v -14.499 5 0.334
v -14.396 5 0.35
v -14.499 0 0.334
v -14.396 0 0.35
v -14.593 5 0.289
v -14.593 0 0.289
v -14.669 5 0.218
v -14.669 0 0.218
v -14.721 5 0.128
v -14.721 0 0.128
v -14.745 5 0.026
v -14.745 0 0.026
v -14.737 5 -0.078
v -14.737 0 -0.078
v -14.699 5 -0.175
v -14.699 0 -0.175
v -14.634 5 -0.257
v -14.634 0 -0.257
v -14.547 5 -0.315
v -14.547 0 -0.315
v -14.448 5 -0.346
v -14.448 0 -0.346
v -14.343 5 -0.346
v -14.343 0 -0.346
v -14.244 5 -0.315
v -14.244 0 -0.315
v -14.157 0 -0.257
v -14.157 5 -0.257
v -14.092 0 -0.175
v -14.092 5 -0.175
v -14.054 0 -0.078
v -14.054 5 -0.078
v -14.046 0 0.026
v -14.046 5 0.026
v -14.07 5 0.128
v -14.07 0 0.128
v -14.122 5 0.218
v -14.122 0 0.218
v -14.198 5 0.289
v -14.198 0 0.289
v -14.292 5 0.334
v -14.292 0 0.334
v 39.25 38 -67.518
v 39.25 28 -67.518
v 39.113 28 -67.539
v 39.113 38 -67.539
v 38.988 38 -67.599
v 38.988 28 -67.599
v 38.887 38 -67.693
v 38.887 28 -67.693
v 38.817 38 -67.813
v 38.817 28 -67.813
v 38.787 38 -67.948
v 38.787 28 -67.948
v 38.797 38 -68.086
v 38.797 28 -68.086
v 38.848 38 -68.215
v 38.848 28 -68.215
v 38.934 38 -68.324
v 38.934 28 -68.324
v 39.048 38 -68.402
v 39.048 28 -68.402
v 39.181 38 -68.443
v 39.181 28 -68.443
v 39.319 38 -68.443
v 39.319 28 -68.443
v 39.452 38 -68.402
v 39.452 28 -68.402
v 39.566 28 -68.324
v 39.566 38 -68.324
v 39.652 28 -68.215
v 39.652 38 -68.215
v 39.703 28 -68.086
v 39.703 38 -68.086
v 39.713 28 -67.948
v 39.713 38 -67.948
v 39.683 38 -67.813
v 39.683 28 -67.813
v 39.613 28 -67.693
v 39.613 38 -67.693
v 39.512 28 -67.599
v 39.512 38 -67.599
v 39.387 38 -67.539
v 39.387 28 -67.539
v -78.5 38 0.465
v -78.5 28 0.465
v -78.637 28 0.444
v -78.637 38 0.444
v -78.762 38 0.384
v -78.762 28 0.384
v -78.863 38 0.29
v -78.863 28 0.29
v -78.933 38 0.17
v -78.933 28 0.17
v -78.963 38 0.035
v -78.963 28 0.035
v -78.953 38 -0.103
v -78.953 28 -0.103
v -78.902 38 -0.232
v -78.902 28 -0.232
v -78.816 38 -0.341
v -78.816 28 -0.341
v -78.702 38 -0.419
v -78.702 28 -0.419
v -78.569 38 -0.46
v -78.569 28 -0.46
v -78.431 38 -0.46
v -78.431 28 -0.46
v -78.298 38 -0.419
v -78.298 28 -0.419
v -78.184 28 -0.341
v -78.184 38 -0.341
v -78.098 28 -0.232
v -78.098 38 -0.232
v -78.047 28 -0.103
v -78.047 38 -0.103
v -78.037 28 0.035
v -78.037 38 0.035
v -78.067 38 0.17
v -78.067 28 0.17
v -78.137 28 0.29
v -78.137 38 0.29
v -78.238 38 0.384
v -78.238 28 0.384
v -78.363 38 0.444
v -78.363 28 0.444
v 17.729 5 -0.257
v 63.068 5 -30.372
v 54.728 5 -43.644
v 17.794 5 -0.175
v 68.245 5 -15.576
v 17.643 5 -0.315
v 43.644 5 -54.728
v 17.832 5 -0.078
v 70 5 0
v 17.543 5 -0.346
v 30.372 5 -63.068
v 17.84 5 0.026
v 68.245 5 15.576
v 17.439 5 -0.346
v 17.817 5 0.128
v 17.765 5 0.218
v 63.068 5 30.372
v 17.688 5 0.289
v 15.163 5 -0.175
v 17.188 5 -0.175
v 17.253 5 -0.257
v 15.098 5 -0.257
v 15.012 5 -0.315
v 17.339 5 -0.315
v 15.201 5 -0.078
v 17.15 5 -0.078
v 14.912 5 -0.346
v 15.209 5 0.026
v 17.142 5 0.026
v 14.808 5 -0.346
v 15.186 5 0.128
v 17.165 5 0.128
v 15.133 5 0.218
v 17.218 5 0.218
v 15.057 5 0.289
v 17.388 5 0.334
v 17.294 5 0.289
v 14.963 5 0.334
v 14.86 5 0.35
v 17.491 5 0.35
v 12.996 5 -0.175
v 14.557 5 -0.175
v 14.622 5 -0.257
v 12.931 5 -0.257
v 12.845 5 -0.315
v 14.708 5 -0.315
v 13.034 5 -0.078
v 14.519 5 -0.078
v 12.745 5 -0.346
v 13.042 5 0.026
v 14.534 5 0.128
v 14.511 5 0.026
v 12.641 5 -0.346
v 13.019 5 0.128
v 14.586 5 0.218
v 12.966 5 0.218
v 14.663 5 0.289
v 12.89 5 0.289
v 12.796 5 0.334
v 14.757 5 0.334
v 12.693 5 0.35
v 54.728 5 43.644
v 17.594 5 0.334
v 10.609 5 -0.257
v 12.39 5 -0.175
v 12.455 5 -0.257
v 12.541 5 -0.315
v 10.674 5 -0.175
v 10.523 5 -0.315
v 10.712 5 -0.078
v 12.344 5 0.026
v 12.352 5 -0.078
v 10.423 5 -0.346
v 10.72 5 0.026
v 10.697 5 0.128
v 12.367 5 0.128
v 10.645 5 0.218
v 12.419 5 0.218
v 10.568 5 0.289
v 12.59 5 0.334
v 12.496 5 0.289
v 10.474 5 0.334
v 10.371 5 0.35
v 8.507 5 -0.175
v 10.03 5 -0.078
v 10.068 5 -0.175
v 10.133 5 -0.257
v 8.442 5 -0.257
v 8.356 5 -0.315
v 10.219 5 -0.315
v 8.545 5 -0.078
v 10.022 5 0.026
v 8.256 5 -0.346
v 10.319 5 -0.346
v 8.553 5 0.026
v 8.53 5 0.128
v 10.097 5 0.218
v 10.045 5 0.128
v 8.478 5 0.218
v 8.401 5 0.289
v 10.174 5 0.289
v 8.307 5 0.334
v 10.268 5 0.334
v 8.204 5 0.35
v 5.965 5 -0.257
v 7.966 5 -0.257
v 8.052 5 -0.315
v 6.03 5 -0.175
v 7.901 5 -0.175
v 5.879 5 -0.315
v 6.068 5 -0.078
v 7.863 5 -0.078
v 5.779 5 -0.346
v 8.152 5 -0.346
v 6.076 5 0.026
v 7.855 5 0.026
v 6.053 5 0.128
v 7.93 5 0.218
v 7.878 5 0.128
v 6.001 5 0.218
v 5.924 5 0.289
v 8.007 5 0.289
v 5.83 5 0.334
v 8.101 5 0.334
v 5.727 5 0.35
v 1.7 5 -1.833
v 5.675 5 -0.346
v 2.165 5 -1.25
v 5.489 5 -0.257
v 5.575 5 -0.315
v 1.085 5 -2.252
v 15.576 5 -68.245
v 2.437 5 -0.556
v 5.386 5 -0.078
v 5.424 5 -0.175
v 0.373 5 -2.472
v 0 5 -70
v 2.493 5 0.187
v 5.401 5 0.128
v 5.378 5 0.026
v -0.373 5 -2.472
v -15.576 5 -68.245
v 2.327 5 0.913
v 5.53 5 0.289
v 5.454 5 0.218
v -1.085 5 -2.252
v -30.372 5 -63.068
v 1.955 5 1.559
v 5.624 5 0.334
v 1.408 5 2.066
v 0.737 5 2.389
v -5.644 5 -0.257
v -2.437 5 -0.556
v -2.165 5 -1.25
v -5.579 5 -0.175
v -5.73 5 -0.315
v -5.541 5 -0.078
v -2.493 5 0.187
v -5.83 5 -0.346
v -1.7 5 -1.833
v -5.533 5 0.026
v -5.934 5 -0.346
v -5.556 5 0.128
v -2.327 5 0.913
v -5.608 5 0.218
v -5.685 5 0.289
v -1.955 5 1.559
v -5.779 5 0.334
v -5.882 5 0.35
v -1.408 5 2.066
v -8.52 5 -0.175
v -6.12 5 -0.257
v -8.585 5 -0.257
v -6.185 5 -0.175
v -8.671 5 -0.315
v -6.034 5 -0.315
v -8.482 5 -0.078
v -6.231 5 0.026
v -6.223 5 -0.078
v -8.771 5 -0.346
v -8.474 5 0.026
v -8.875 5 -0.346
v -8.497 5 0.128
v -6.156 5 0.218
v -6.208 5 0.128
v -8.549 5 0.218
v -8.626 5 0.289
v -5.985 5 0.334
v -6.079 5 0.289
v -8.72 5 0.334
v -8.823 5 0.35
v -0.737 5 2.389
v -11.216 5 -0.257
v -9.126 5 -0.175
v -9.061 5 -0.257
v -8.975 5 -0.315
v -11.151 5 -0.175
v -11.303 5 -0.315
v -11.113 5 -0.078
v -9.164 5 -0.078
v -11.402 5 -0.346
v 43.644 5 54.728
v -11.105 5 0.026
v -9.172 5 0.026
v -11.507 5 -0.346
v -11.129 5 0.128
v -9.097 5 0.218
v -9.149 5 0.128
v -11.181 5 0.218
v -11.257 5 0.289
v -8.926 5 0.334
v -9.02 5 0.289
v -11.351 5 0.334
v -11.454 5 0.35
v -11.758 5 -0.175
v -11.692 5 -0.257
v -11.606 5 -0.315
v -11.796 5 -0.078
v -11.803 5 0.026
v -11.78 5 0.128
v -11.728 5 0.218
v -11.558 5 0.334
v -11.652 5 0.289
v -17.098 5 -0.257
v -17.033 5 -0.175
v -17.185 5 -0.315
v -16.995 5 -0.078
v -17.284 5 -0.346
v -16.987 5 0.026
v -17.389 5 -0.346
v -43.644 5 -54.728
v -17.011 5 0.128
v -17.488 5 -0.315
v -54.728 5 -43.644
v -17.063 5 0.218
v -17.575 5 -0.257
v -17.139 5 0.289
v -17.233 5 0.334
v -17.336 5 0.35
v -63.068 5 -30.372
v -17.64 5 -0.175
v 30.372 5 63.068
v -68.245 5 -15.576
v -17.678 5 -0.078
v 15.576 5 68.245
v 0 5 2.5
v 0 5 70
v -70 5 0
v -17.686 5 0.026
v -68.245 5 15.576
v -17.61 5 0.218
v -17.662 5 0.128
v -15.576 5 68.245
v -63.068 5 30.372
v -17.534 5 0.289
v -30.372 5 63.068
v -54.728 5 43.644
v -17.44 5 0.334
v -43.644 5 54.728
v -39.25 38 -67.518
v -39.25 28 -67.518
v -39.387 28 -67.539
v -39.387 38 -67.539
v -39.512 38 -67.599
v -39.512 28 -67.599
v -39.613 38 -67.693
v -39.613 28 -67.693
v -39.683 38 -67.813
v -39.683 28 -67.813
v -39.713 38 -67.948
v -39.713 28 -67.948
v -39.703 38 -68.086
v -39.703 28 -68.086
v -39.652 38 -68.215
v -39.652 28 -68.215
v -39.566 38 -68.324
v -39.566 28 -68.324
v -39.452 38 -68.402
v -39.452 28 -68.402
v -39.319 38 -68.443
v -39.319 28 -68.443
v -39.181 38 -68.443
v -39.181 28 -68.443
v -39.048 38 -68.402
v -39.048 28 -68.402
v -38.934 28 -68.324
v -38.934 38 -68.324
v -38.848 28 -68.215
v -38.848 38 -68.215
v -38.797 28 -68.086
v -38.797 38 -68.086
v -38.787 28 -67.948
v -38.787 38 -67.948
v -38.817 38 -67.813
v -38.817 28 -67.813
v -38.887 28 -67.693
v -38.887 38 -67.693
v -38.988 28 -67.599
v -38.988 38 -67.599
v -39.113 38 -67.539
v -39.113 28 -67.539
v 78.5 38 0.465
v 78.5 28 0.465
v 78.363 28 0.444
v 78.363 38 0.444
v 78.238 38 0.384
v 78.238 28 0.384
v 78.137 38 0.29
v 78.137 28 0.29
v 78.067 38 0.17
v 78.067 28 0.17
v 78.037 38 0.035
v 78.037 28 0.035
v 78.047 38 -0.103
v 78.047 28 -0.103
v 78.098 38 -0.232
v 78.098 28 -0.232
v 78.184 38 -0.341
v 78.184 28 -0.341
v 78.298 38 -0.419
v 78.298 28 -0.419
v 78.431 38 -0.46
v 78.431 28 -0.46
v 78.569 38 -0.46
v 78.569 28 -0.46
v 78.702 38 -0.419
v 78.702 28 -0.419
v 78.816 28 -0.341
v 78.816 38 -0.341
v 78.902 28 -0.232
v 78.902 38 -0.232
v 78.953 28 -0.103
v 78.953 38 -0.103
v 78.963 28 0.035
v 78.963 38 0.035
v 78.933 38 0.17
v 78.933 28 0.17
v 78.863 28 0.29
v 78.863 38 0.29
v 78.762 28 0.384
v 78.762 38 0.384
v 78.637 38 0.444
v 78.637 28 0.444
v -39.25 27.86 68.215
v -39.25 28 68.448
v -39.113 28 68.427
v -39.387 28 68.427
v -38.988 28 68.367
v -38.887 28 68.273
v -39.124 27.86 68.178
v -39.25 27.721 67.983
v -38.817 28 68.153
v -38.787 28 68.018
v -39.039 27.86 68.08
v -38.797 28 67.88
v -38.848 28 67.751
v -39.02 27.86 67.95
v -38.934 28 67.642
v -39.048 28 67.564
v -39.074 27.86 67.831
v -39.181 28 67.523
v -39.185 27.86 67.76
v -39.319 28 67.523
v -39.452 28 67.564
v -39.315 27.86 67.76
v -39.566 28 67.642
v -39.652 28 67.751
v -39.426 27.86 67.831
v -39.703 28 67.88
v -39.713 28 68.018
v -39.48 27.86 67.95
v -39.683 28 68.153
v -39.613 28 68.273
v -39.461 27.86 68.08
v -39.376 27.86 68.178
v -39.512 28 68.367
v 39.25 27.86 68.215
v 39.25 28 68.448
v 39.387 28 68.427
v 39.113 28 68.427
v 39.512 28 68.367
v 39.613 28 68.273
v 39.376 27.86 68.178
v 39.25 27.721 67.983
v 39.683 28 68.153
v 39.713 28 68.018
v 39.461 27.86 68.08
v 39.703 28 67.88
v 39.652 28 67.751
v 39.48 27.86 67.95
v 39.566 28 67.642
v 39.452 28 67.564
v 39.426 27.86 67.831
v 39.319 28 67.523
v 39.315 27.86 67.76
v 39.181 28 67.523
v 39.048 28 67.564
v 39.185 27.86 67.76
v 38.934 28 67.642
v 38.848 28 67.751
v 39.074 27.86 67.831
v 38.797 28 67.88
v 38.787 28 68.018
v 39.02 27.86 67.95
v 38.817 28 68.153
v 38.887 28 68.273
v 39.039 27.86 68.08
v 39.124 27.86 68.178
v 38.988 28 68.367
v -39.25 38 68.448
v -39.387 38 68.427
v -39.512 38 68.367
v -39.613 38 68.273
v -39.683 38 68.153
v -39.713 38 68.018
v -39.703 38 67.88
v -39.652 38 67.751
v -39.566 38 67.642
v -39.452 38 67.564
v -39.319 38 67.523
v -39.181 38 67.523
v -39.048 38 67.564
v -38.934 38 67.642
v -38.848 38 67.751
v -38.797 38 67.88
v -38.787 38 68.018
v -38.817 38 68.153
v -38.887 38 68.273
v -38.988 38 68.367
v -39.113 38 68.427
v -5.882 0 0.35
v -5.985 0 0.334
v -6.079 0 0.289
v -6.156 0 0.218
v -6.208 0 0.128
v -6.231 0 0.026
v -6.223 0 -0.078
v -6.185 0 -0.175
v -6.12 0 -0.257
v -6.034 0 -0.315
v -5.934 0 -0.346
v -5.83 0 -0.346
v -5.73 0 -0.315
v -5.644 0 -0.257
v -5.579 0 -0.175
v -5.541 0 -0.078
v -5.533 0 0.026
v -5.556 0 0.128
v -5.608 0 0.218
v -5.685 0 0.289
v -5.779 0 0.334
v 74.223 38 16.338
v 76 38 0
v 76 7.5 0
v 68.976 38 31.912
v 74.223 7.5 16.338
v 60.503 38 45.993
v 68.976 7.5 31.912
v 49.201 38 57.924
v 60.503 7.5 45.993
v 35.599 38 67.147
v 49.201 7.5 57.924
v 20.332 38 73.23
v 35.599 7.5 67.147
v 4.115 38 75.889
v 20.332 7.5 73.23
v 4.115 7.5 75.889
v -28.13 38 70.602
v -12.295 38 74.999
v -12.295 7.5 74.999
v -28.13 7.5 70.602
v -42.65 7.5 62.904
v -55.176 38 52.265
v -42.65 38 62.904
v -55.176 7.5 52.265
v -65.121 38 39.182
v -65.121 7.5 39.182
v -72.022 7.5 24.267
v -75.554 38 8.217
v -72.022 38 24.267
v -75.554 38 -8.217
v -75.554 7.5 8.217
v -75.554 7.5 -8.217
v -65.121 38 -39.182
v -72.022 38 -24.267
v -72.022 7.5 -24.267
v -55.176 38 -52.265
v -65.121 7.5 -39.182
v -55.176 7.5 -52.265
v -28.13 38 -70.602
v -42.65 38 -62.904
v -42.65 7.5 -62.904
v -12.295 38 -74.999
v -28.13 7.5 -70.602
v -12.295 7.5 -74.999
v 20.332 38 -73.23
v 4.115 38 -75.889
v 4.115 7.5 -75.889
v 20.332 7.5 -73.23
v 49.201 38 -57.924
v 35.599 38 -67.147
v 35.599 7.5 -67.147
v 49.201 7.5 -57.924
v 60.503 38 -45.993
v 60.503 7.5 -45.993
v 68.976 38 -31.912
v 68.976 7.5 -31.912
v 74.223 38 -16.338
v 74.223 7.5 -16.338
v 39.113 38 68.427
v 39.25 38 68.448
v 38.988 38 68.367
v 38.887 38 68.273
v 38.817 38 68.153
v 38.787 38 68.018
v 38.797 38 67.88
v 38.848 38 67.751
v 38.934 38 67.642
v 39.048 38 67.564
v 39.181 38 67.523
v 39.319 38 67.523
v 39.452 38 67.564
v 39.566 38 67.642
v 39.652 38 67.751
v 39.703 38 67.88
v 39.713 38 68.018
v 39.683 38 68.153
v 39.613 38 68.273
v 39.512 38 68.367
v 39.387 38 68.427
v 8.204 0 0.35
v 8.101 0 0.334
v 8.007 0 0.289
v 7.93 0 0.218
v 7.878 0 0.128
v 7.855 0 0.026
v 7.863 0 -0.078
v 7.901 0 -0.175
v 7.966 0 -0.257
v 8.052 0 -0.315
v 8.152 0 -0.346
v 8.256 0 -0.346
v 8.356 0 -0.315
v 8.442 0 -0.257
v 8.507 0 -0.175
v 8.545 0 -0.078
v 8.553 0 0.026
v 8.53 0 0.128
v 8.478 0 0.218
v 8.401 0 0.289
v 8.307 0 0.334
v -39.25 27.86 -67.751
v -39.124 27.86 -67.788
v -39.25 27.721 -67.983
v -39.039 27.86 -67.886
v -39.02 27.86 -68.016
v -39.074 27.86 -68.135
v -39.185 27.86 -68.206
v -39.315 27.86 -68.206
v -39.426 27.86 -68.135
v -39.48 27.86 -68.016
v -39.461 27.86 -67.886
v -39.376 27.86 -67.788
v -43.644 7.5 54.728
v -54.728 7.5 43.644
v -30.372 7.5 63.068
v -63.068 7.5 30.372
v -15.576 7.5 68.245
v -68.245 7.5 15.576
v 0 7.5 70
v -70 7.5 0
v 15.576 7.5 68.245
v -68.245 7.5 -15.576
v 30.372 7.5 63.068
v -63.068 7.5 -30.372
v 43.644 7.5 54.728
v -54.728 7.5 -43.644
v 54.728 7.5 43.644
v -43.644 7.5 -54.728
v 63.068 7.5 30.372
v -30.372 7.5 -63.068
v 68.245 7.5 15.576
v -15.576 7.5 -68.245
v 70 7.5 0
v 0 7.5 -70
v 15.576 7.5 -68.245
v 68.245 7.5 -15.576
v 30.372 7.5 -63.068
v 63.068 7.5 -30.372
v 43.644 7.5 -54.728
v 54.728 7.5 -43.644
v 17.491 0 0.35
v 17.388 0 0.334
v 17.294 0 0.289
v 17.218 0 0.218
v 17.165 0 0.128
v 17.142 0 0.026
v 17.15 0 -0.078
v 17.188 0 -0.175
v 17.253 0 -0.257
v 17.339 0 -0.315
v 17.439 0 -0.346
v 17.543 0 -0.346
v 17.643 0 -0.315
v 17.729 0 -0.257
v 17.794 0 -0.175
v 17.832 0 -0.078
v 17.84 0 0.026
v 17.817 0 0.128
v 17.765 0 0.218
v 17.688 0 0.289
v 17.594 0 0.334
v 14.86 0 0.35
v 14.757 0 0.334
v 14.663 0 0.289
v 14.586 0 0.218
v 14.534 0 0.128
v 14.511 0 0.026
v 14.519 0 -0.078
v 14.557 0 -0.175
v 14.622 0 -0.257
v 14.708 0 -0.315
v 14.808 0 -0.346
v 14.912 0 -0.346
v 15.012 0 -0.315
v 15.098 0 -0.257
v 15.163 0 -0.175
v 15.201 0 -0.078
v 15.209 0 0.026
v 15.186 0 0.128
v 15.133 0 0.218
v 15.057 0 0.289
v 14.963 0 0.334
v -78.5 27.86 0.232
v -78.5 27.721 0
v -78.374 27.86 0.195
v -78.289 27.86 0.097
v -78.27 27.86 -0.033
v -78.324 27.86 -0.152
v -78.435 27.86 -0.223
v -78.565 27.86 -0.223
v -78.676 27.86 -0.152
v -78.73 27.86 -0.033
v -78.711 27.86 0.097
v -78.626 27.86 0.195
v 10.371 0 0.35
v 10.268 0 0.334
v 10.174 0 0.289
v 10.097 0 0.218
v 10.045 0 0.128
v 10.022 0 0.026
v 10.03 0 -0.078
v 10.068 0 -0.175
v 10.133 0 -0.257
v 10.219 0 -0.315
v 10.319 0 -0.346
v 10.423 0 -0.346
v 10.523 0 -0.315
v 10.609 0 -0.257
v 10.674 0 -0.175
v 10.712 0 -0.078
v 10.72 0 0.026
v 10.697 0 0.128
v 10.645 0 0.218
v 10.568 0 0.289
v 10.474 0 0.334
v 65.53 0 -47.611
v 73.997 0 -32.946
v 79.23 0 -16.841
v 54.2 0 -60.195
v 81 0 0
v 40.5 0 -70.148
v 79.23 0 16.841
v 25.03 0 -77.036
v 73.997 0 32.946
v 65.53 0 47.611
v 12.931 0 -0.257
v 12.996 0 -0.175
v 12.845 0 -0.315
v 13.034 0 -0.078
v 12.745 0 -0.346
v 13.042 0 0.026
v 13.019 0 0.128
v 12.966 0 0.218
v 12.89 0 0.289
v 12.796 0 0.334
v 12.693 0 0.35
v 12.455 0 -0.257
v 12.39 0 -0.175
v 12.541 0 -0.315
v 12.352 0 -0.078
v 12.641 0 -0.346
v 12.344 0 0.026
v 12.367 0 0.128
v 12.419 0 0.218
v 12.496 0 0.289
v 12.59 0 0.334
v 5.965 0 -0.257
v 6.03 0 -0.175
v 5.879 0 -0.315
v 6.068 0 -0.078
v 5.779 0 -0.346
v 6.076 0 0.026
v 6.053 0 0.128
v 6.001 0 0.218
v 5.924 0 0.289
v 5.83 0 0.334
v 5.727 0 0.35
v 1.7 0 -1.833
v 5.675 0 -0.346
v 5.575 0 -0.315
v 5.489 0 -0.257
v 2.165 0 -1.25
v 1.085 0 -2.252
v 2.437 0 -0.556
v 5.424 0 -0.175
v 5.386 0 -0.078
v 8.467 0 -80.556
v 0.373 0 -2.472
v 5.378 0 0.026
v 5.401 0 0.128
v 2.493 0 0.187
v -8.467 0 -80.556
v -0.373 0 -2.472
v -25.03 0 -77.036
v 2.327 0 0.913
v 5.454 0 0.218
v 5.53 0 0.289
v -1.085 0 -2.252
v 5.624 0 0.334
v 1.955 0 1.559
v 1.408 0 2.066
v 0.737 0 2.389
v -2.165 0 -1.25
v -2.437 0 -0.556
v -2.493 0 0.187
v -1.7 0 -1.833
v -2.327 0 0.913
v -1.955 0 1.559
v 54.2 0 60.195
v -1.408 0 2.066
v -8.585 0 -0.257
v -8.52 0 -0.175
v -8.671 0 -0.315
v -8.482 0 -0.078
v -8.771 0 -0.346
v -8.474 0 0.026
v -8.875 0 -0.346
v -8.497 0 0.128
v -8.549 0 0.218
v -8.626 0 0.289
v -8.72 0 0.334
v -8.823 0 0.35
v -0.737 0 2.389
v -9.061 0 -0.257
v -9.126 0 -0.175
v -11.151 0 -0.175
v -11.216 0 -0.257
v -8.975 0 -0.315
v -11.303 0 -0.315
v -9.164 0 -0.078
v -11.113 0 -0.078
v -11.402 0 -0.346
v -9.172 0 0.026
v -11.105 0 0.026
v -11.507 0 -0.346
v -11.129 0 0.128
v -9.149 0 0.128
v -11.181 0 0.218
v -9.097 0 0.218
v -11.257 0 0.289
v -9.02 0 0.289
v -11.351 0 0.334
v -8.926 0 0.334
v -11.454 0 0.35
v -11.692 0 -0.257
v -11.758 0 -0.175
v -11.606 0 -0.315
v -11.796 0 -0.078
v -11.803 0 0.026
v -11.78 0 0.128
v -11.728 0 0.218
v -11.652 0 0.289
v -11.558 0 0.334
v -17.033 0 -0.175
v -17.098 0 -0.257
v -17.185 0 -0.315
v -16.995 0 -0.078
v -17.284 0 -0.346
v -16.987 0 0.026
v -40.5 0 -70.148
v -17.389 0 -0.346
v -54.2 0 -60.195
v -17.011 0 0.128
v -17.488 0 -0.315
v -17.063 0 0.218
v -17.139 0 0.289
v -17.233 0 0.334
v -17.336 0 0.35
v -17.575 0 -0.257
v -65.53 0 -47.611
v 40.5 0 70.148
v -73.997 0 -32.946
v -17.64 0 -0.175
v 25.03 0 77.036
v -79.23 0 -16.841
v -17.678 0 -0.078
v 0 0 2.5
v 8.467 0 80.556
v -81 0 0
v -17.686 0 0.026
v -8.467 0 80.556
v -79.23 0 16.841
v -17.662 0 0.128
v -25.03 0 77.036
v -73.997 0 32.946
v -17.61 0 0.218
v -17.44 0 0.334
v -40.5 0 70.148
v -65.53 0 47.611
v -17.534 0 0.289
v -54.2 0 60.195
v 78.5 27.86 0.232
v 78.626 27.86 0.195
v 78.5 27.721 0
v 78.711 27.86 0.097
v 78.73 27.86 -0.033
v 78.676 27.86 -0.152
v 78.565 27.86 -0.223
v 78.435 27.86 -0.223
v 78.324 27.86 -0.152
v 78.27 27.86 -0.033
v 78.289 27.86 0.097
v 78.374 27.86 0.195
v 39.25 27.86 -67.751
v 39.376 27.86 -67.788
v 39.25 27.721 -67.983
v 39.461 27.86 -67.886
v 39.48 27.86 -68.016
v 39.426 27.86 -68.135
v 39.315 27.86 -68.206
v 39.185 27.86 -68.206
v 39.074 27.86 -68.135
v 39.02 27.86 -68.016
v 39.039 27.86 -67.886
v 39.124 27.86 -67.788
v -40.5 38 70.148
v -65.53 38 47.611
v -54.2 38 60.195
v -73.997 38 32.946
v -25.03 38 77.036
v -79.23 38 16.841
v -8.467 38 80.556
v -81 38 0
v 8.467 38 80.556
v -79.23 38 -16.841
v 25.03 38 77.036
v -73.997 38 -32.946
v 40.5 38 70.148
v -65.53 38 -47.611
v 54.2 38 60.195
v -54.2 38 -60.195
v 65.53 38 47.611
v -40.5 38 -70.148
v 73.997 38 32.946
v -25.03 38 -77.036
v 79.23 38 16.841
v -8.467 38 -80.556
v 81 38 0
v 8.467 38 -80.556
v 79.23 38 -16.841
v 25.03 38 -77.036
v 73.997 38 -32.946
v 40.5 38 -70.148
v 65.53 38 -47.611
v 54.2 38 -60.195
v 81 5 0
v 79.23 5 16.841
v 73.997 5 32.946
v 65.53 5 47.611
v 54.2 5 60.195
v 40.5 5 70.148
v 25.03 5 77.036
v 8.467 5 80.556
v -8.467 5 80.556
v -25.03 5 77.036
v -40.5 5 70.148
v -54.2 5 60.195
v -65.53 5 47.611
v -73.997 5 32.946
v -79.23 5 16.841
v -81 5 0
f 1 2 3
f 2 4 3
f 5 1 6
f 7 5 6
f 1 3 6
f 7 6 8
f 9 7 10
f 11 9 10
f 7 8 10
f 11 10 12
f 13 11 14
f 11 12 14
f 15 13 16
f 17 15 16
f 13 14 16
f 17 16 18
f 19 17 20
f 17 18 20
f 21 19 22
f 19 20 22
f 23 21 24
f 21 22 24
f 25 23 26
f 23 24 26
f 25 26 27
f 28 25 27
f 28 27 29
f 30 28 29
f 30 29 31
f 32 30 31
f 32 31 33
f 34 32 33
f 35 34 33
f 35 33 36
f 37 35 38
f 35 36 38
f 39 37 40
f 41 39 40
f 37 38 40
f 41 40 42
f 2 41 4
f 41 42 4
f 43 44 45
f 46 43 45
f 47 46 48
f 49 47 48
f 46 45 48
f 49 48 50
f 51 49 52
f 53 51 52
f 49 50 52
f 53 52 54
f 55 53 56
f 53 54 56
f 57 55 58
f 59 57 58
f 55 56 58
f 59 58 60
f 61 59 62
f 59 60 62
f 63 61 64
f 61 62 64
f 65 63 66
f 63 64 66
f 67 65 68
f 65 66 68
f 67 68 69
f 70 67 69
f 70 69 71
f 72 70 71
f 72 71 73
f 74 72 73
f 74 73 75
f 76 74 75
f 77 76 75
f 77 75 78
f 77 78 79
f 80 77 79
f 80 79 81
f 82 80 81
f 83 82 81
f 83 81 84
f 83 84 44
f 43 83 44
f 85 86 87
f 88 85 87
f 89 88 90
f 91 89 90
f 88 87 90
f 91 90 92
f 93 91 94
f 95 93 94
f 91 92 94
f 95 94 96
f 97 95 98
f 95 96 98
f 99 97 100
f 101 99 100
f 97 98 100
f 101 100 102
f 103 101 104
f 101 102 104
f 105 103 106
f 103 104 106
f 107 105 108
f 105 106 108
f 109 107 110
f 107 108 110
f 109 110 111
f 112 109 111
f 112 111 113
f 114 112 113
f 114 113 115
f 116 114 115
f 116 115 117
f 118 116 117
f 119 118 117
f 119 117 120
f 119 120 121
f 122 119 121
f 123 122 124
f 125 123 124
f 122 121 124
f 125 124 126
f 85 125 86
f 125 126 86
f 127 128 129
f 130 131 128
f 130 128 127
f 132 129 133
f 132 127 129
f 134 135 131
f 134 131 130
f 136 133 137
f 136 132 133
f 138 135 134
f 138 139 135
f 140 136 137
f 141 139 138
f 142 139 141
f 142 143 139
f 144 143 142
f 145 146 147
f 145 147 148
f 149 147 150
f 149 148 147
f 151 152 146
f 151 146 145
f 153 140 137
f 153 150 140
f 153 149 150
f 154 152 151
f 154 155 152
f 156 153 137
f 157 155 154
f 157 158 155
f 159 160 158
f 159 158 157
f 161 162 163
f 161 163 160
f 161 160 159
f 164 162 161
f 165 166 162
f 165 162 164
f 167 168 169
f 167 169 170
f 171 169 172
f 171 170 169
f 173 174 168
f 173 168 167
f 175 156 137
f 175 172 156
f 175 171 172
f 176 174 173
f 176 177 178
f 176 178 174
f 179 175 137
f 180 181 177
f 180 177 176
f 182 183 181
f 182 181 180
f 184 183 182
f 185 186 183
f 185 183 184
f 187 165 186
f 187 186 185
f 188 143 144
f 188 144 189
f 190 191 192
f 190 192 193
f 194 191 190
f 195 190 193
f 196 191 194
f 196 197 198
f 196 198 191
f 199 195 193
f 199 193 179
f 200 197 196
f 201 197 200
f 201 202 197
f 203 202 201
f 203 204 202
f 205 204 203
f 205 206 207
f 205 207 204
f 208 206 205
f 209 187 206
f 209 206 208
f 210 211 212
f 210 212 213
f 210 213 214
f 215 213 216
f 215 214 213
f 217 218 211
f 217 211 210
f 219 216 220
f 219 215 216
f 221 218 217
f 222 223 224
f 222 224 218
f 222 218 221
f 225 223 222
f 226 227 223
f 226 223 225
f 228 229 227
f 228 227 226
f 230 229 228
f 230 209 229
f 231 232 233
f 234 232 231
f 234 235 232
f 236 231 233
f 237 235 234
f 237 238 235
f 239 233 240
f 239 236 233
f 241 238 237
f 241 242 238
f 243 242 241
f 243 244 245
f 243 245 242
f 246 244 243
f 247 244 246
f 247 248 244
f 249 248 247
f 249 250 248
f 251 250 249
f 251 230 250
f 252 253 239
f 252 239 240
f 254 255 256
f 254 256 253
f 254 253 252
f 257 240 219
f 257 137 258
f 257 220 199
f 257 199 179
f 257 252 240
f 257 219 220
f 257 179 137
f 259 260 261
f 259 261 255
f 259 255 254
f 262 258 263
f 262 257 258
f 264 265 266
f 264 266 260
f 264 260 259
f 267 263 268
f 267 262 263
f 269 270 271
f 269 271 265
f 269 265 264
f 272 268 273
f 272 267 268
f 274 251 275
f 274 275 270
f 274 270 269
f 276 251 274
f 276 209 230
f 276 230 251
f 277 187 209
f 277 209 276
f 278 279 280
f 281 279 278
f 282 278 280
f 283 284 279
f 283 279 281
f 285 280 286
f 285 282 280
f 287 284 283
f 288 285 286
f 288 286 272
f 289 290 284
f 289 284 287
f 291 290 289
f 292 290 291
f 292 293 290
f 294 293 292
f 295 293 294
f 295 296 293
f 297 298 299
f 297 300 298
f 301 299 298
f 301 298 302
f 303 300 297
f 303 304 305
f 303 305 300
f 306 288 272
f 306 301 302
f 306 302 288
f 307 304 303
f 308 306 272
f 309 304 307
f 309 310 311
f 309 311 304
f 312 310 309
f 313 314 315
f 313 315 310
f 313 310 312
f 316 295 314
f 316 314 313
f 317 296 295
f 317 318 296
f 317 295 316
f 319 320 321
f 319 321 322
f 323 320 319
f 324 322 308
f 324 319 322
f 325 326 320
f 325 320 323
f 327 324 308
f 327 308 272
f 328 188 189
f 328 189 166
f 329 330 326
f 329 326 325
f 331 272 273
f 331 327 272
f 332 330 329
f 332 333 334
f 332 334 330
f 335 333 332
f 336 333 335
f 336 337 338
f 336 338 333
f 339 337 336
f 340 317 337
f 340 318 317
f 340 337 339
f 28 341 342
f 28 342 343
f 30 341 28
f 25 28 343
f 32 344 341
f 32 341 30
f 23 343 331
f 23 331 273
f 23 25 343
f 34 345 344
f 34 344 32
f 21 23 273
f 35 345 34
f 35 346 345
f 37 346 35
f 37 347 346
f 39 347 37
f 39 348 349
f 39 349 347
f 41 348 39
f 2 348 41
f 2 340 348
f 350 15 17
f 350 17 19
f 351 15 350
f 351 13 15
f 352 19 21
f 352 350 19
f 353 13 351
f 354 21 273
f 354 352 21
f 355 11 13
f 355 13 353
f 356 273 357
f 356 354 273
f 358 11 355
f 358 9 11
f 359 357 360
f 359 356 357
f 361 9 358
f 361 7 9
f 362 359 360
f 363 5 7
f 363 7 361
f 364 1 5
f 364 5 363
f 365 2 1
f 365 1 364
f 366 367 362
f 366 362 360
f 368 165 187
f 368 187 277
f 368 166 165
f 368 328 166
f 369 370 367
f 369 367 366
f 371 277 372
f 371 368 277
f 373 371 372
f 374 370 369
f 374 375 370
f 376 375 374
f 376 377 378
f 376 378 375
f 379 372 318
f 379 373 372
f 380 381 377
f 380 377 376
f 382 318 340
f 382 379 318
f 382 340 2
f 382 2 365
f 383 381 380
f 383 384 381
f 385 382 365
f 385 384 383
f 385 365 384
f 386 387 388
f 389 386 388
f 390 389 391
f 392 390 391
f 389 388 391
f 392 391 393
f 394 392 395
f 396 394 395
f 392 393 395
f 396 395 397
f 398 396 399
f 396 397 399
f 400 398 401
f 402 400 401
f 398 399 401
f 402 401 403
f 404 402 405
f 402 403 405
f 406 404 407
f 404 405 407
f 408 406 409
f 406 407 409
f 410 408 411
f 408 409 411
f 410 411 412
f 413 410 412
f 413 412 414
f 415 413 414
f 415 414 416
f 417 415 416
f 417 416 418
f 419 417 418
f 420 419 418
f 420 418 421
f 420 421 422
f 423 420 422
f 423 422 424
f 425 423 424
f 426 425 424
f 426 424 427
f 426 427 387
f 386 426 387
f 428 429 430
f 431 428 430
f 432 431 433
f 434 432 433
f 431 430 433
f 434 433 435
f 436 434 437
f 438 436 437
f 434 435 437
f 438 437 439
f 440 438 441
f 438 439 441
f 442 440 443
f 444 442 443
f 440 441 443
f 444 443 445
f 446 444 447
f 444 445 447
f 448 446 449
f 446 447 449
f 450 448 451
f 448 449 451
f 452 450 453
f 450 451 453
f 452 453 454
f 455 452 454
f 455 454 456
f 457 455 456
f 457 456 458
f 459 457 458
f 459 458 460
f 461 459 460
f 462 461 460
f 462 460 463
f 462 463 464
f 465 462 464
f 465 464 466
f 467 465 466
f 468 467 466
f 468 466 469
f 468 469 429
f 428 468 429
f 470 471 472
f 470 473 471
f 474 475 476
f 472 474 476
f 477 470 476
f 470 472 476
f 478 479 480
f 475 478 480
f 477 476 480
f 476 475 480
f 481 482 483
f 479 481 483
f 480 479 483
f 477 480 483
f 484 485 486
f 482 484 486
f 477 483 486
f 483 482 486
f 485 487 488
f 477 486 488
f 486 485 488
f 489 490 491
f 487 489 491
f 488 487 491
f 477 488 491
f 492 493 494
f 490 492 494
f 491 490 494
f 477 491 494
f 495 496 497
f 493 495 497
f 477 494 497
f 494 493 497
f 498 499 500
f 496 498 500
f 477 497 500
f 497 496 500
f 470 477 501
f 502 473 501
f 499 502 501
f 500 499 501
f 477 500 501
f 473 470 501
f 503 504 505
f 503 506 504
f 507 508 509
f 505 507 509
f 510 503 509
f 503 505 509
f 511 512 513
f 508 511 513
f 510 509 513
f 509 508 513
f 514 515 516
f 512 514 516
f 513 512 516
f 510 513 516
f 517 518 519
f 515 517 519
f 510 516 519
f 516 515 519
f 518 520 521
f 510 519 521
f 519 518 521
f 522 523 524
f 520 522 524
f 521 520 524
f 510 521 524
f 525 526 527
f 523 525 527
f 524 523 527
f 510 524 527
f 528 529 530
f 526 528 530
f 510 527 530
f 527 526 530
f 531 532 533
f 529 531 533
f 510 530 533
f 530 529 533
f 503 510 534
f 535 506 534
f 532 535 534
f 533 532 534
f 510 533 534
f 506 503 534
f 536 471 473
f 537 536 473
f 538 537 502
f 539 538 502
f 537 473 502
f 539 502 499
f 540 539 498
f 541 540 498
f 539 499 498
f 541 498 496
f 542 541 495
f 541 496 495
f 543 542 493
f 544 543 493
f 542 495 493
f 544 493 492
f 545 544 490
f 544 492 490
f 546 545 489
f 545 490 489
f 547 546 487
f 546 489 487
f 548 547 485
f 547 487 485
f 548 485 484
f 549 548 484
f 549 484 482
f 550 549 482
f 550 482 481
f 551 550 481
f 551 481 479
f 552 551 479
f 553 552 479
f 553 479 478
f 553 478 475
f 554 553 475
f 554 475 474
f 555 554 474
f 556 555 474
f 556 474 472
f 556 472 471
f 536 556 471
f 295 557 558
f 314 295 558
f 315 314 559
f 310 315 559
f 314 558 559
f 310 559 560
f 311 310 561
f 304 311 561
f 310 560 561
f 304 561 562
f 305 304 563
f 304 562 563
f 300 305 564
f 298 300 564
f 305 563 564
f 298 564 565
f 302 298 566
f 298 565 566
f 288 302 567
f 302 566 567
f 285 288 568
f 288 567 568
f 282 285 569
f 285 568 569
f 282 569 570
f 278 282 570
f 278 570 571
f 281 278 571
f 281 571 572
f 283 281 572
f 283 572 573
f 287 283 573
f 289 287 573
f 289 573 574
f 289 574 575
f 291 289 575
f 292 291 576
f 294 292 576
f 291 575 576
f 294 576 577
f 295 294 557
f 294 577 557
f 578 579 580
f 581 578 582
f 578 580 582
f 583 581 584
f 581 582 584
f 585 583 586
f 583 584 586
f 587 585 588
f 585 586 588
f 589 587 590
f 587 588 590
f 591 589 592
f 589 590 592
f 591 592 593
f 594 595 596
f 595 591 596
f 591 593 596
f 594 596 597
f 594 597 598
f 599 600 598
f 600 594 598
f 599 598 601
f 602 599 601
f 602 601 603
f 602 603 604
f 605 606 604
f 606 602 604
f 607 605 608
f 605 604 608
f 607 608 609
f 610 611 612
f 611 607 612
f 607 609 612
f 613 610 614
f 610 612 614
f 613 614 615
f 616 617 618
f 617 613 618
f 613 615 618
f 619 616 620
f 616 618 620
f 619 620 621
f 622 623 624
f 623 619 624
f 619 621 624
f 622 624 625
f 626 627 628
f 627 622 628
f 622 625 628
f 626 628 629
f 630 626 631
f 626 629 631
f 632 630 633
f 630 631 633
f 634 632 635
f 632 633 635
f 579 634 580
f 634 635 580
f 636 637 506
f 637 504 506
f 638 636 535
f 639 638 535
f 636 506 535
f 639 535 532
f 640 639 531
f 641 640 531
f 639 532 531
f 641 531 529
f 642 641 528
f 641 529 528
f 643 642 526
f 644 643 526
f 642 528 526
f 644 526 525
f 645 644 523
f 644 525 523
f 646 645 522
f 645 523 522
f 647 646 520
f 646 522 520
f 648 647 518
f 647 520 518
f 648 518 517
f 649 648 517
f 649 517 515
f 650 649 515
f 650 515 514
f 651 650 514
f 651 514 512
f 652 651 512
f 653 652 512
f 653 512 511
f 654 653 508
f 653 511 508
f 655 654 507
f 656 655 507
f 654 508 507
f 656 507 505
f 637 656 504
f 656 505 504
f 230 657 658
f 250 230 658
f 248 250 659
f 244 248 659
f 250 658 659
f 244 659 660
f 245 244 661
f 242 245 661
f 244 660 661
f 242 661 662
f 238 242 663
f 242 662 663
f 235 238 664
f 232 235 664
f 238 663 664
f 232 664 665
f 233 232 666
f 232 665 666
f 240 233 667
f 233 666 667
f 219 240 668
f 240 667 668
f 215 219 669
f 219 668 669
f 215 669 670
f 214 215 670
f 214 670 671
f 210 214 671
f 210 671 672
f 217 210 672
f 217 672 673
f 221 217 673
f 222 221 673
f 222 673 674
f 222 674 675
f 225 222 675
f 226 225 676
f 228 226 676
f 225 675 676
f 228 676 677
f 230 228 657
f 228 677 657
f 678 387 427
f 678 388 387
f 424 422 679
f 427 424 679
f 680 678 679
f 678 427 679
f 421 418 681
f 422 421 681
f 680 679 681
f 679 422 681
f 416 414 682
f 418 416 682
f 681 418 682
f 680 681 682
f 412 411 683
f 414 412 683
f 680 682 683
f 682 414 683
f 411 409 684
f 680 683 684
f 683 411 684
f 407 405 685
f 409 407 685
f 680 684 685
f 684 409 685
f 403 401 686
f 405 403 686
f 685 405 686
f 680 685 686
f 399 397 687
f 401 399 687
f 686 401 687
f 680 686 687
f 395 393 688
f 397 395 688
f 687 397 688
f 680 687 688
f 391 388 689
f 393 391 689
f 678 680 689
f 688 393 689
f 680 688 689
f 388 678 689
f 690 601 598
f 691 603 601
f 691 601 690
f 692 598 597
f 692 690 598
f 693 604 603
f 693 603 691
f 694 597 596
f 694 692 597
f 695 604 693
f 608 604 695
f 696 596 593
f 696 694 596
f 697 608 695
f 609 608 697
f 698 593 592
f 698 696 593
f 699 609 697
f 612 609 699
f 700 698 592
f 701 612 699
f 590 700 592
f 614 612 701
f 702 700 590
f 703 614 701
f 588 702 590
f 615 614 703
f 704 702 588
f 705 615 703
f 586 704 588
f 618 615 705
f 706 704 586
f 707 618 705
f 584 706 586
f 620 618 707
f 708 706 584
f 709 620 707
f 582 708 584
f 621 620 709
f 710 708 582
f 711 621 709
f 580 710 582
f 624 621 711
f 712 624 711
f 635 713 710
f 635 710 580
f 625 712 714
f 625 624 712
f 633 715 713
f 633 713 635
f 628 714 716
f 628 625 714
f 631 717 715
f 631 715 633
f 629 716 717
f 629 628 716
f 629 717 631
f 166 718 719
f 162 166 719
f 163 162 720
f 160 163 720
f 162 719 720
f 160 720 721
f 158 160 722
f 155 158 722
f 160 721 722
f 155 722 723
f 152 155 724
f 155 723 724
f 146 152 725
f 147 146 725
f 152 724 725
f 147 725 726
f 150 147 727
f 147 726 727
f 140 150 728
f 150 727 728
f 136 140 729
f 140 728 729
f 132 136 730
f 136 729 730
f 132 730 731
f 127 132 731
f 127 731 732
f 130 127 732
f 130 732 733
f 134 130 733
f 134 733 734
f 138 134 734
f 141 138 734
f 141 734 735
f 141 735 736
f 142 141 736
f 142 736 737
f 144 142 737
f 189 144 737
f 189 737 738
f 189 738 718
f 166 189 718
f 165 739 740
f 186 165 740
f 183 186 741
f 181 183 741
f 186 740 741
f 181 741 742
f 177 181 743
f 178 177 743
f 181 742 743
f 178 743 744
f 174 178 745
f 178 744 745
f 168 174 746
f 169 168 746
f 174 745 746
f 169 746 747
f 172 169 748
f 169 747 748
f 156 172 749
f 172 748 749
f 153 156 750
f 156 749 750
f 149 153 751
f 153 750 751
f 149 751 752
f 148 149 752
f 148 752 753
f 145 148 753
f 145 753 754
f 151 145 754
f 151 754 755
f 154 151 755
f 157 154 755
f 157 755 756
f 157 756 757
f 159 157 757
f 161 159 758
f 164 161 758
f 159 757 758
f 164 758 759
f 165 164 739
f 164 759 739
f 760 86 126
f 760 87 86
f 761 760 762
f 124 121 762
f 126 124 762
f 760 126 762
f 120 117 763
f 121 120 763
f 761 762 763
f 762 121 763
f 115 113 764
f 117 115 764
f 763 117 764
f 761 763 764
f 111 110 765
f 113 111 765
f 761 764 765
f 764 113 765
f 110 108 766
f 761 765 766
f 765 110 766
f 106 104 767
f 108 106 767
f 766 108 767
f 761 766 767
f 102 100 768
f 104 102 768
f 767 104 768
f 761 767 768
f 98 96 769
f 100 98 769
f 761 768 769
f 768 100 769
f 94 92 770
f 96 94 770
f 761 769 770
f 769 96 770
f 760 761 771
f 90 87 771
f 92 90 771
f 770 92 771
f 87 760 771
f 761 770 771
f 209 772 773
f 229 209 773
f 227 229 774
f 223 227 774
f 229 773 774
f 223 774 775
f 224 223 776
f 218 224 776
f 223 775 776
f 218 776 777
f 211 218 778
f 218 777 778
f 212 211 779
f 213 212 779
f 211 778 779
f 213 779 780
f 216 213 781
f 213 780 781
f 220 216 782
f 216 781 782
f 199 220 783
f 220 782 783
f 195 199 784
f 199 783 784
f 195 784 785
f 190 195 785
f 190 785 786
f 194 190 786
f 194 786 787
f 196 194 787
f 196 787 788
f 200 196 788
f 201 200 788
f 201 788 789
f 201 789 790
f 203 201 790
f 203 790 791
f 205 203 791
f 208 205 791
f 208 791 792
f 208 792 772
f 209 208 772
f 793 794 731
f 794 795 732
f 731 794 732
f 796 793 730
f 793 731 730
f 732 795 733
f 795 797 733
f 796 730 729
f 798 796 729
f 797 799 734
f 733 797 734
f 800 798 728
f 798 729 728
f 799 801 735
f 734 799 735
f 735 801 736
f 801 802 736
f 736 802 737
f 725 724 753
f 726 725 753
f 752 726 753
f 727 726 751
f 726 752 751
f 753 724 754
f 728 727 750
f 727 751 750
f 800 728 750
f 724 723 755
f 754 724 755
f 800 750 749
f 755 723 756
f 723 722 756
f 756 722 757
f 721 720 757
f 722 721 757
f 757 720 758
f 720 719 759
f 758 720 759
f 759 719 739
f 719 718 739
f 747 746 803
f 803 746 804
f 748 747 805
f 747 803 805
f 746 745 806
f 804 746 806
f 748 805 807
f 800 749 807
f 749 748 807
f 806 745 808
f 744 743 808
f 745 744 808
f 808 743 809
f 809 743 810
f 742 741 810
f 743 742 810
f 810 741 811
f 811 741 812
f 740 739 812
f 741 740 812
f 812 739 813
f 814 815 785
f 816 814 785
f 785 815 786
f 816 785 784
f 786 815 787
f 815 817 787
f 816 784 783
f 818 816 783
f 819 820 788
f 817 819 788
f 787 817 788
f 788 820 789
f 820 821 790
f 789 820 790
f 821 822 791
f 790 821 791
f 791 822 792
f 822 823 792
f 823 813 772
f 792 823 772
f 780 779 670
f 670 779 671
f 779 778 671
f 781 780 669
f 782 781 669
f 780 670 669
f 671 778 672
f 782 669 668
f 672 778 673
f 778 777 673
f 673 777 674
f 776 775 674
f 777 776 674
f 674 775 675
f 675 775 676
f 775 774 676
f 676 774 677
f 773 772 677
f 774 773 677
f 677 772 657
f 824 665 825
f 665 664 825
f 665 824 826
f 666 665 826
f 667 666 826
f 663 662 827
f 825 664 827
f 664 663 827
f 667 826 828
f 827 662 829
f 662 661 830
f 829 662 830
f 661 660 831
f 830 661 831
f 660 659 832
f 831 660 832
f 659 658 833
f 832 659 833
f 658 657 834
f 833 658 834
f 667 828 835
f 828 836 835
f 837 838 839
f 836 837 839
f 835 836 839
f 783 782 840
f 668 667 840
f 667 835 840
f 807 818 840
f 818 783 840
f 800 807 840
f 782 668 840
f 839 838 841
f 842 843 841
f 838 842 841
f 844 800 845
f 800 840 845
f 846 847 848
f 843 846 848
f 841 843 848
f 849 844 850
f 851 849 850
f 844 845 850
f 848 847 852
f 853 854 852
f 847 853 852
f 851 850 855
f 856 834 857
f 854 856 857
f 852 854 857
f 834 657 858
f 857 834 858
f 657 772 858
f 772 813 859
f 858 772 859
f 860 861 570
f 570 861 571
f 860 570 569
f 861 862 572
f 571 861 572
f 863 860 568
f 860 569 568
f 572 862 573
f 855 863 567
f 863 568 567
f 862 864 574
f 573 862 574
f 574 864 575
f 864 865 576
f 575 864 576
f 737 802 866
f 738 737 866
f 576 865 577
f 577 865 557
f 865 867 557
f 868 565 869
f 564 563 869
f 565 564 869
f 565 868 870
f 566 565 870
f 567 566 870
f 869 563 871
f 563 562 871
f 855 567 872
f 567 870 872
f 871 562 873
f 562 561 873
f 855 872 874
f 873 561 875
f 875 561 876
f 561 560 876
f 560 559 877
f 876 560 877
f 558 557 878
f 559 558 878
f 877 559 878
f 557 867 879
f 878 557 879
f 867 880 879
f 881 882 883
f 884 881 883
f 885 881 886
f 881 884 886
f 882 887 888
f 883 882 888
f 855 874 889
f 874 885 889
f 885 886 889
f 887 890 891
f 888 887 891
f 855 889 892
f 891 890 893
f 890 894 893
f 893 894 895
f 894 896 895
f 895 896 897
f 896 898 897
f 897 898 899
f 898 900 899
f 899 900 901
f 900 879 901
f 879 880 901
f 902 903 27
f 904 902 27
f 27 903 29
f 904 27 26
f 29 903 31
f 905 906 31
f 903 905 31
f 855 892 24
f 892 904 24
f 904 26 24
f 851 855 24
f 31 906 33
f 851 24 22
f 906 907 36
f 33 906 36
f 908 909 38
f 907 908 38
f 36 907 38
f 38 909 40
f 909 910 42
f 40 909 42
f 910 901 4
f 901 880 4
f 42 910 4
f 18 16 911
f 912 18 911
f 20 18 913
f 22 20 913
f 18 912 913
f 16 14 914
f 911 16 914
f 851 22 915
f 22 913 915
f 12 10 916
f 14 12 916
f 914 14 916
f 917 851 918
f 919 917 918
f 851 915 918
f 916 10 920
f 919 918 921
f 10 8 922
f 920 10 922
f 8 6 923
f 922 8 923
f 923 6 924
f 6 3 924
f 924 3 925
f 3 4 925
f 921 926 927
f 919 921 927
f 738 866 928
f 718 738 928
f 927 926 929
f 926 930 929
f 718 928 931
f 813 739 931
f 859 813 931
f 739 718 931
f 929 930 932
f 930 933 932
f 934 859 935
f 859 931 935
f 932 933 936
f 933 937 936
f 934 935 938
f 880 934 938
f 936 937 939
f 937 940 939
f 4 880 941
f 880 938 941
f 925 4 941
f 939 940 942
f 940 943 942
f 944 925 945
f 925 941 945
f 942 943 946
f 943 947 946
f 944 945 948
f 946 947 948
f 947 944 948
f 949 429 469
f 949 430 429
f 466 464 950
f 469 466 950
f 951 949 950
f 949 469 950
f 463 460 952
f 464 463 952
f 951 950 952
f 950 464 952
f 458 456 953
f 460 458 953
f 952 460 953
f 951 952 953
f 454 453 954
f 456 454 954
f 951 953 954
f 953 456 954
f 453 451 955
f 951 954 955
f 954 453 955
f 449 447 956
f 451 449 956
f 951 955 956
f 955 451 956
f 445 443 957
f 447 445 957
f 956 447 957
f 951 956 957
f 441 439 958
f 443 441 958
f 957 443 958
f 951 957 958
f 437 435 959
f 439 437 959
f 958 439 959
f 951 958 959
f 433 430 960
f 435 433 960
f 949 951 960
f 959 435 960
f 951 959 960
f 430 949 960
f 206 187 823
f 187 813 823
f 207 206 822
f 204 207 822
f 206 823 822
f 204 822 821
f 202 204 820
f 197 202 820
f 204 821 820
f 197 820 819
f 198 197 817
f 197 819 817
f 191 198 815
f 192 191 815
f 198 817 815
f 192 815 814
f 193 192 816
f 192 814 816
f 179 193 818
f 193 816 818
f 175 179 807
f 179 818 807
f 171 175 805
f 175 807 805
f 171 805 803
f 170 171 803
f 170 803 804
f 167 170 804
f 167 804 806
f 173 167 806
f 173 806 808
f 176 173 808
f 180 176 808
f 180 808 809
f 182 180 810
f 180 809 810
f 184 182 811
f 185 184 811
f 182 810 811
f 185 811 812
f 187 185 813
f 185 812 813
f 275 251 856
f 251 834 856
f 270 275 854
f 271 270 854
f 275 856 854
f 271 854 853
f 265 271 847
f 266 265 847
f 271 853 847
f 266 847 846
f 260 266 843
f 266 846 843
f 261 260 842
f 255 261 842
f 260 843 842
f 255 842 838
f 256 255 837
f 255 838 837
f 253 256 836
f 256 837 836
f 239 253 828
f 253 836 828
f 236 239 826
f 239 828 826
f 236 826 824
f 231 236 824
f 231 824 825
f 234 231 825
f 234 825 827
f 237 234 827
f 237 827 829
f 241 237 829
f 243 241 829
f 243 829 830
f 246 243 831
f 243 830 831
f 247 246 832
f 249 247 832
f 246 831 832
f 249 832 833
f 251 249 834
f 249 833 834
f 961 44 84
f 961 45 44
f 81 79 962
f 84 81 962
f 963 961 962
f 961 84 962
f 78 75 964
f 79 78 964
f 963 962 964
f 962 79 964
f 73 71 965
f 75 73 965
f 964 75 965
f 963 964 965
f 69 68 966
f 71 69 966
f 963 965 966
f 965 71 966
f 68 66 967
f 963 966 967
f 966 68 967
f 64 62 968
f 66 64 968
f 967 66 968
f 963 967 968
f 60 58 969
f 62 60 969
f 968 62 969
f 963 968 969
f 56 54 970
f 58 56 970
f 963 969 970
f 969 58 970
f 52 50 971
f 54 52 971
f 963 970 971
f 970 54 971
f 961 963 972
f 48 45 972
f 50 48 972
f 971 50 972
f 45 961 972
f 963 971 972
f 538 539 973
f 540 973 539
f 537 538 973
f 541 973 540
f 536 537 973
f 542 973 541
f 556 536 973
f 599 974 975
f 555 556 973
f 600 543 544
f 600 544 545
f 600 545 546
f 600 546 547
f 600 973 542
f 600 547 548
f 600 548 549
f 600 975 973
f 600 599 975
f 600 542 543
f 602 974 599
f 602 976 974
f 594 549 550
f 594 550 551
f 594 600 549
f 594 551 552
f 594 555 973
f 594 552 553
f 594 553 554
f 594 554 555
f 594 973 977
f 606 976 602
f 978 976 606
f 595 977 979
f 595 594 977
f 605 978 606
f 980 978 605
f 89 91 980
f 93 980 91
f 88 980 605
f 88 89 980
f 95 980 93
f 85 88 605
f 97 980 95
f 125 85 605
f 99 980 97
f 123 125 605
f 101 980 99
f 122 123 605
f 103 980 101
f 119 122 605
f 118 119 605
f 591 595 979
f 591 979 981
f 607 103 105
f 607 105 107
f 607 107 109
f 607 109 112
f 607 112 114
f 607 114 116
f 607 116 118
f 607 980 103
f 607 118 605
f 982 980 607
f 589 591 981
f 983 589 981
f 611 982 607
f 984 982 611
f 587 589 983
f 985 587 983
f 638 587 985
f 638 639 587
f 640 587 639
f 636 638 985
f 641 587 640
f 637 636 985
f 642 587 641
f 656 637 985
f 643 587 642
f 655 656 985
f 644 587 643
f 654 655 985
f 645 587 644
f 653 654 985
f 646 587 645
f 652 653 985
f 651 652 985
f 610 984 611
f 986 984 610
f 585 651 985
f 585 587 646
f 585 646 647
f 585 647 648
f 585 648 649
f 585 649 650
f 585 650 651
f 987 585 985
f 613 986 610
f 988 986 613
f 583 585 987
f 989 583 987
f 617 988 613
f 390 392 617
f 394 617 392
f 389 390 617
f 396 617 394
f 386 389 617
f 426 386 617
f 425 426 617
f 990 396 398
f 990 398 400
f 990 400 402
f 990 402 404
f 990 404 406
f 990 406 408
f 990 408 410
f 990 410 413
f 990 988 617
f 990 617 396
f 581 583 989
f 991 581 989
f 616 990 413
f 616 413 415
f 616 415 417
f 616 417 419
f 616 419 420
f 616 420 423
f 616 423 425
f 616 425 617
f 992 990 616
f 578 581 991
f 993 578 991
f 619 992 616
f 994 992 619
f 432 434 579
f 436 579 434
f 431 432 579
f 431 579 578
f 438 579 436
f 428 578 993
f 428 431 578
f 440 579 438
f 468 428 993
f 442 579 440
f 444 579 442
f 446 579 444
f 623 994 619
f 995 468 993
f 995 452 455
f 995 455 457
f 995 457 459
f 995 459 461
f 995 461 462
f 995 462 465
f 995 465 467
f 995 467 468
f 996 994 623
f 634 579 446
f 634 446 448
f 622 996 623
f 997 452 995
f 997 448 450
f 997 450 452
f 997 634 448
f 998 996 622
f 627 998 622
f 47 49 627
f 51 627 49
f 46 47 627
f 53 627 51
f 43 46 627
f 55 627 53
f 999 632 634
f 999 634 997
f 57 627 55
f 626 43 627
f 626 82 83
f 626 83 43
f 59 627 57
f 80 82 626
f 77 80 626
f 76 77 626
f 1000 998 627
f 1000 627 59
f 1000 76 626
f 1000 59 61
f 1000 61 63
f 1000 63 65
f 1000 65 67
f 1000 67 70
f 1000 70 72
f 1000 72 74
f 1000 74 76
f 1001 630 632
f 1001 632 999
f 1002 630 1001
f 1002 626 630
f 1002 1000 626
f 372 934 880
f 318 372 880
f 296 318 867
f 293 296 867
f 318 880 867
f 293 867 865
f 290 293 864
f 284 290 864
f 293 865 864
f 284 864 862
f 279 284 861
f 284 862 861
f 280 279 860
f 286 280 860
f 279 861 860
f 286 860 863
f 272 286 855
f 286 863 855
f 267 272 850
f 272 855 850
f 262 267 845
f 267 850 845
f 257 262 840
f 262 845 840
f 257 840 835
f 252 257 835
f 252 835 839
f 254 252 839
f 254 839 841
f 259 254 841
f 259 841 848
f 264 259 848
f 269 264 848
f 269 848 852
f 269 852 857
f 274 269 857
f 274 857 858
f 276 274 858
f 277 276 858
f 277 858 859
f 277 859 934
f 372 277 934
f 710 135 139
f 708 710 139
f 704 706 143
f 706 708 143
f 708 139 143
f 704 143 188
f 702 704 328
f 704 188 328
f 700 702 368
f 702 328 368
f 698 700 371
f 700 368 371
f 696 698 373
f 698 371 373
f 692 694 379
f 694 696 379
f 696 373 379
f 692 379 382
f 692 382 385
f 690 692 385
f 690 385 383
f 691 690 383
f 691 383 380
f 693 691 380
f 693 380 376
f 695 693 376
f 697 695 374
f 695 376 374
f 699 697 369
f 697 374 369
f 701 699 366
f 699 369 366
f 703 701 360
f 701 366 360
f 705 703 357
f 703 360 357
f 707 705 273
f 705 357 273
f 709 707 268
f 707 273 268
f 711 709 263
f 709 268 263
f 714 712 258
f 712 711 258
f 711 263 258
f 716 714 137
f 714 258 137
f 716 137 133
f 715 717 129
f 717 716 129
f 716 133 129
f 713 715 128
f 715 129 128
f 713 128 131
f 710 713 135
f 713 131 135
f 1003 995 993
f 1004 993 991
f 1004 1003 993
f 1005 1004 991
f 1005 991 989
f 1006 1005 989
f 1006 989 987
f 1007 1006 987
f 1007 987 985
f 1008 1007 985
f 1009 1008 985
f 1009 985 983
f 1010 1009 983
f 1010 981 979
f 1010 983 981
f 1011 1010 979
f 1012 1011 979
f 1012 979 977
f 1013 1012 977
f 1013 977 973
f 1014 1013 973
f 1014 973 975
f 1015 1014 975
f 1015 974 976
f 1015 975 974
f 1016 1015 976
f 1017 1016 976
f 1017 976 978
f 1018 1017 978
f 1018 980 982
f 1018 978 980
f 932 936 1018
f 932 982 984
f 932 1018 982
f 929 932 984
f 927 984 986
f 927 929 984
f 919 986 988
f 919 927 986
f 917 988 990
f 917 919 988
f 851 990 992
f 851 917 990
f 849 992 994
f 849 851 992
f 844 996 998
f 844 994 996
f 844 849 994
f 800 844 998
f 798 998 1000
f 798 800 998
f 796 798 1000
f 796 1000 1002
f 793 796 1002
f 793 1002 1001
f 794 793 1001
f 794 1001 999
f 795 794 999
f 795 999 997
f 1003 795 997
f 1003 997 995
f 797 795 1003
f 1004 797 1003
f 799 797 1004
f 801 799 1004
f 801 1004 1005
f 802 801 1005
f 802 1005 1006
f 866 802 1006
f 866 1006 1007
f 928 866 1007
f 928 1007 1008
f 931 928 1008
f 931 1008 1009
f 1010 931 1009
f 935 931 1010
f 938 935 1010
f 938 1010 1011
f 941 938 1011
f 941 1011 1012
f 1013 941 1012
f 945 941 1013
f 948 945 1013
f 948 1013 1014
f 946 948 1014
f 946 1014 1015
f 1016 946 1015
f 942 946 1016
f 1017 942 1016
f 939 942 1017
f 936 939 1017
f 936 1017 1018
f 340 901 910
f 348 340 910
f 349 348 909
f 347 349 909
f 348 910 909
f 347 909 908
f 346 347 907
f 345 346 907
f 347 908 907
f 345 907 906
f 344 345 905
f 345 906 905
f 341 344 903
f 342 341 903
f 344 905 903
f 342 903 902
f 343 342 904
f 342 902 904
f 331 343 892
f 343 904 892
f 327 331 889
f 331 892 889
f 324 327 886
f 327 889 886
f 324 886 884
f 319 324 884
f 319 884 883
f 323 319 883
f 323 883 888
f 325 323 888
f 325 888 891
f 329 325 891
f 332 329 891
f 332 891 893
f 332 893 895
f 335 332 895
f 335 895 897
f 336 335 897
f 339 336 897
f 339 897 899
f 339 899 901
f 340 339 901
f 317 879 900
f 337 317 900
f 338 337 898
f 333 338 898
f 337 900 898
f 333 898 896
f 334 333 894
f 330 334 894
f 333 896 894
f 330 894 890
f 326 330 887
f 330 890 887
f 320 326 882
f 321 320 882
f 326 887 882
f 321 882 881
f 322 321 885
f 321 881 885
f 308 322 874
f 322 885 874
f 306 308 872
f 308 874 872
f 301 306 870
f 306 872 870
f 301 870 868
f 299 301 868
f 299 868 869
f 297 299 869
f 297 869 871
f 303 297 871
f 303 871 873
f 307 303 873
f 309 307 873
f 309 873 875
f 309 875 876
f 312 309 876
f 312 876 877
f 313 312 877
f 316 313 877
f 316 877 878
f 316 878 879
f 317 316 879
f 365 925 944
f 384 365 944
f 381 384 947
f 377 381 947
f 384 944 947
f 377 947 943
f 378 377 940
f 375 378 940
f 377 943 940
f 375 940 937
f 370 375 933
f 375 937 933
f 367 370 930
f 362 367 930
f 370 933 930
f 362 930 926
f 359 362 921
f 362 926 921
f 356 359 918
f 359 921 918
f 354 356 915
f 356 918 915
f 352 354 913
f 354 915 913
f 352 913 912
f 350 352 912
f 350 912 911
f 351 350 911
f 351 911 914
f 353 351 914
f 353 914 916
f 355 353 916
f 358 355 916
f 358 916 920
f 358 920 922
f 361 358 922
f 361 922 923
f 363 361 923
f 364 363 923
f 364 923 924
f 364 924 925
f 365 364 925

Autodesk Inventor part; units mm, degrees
ref_plane "YZ Plane" through (0, 0, 0) normal (1, 0, 0) x (0, 1, 0)
ref_plane "XZ Plane" through (0, 0, 0) normal (0, 1, 0) x (-1, 0, 0)
ref_plane "XY Plane" through (0, 0, 0) normal (0, 0, 1) x (1, 0, 0)
sketch "Skizze1" plane through (0, 0, 0) normal (0, 1, 0) x (-1, 0, 0)
  circle A0 centre (0, 0) radius 81
  dimension "d0" = 162
extrude "Extrusion1" add sketch "Skizze1" along normal blind 5
sketch "Skizze2" plane through (0, 5, 0) normal (0, 1, 0) x (1, 0, 0)
  circle A0 centre (0, 0) radius 70
  circle A1 centre (0, 0) radius 20
  circle A2 centre (0, 0) radius 81 projected
  circle A3 centre (0, 0) radius 76
  point P0 (-17.3365, 0)
  point P1 (-14.3955, 0)
  point P2 (-11.4544, 0)
  point P3 (-8.823, 0)
  point P4 (-5.882, 0)
  point P5 (5.7272, 0)
  point P6 (8.2039, 0)
  point P7 (10.3709, 0)
  point P8 (12.6928, 0)
  point P9 (14.8598, 0)
  point P10 (17.4912, 0)
  dimension "d3" = 140
  dimension "d4" = 40
  dimension "d21" = 152
hole "Bohrung1" at (0, 5, 0) direction (0, -1, 0) diameter 5 end through all
extrude "Extrusion2" add sketch "Skizze2" along normal blind 2.5 contours A2 | A3
hole "Bohrung2" at (-17.3365, 5, 0) at (-14.3955, 5, 0) at (-11.4544, 5, 0) at (-8.823, 5, 0) at (-5.882, 5, 0) at (5.7272, 5, 0) at (8.2039, 5, 0) at (10.3709, 5, 0) at (12.6928, 5, 0) at (14.8598, 5, 0) at (17.4912, 5, 0) direction (0, -1, 0) diameter 0.7 end through all
extrude "Extrusion3" add sketch "Skizze2" along normal blind 33 contours A2
sketch "Skizze3" plane through (0, 38, 0) normal (0, 1, 0) x (1, 0, 0)
  circle A0 centre (39.25, 67.983) radius 1.2 projected
  circle A1 centre (-39.25, 67.983) radius 1.2 projected
  circle A2 centre (39.25, -67.983) radius 1.2 projected
  circle A3 centre (-39.25, -67.983) radius 1.2 projected
  circle A4 centre (78.5, 0) radius 1.2 projected
  circle A5 centre (-78.5, 0) radius 1.2 projected
  point P0 (0, 0)
hole "Bohrung3" at (39.25, 38, -67.983) at (39.25, 38, 67.983) at (-39.25, 38, 67.983) at (-78.5, 38, 0) at (-39.25, 38, -67.983) at (78.5, 38, 0) direction (0, -1, 0) diameter 0.9294 depth 10 tip angle 118 thread size "M1.2x0.25" class "6H" standard "ISO Metric profile"
